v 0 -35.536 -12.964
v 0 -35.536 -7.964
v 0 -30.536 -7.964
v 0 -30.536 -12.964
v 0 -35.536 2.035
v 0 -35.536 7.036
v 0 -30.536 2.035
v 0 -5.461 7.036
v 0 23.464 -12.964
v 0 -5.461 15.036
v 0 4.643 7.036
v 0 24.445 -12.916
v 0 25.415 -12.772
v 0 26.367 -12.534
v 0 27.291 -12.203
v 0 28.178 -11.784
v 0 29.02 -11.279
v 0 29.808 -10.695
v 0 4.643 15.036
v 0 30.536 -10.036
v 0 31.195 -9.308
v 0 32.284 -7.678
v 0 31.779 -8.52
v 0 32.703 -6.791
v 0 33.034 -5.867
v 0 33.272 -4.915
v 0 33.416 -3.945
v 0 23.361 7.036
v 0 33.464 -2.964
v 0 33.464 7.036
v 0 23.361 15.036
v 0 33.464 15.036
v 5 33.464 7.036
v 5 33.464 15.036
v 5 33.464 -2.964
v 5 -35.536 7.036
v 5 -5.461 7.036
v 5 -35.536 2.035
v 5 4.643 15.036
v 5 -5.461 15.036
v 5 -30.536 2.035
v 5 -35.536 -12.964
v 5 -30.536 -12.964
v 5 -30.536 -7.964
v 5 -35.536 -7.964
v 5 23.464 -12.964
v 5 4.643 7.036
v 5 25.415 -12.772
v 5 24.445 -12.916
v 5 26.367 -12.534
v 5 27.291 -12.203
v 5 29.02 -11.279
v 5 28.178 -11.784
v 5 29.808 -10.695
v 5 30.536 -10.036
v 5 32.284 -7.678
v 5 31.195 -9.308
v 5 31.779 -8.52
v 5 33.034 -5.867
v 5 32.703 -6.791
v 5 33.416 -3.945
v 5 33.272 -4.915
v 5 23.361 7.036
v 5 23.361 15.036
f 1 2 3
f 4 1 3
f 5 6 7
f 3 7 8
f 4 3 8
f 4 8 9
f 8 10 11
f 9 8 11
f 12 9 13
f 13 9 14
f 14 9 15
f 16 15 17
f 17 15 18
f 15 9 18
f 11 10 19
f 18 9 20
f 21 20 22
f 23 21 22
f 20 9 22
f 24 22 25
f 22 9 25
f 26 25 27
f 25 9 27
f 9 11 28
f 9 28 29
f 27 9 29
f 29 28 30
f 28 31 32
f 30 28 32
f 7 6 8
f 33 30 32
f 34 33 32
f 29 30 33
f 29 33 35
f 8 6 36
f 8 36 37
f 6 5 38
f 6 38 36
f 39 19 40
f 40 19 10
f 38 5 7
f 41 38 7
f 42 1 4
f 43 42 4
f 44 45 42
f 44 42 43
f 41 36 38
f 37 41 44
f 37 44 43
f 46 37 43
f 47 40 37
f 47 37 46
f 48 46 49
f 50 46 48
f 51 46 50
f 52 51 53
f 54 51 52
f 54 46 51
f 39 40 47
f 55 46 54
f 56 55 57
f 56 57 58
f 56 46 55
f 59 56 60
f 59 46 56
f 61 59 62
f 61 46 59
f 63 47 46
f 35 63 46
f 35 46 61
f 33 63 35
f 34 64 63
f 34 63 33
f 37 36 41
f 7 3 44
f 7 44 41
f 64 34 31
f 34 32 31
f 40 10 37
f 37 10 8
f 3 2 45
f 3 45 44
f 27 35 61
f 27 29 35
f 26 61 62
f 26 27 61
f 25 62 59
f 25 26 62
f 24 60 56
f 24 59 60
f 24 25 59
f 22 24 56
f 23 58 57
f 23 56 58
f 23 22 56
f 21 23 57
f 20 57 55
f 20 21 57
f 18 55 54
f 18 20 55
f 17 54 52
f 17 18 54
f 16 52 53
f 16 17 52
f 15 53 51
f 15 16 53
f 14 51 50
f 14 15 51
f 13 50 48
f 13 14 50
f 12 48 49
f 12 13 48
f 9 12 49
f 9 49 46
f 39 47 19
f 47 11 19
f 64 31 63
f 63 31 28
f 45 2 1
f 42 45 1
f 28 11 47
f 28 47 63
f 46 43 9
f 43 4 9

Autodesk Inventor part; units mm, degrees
ref_plane "YZ Plane" through (0, 0, 0) normal (1, 0, 0) x (0, 1, 0)
ref_plane "XZ Plane" through (0, 0, 0) normal (0, 1, 0) x (-1, 0, 0)
ref_plane "XY Plane" through (0, 0, 0) normal (0, 0, 1) x (1, 0, 0)
sketch "dds" plane through (0, -35.5355, 2.0355) normal (1, 0, 0) x (0, 1, 0)
  line L0 (0, -9.9999) -> (5, -9.9999)
  line L1 (0, -9.9999) -> (0, -15)
  line L2 (0, -15) -> (5, -15)
  line L3 (0, 0) -> (5, 0)
  line L4 (5, -9.9999) -> (5, 0)
  line L5 (5, -15) -> (59, -15)
  line L6 (0, 0) -> (0, 5)
  line L7 (69, 5) -> (69, 13)
  line L8 (69, 5) -> (69, -5)
  arc A0 (59, -15) -> (69, -5) centre (59, -5) ccw
  line L9 (69, 13) -> (58.8965, 13)
  line L10 (58.8965, 13) -> (58.8965, 5)
  line L11 (40.1783, 13) -> (30.0747, 13)
  line L12 (40.1783, 5) -> (40.1783, 13)
  line L13 (30.0747, 13) -> (30.0747, 5)
  line L14 (0, 5) -> (30.0747, 5)
  line L15 (40.1783, 5) -> (58.8965, 5)
  point P0 (69, -15)
  point P1 (8.1162, -2.0146)
  dimension "d0" = 10
  dimension "d1" = 8
extrude "Side" add sketch "dds" along normal blind 5
properties part number "Side"
